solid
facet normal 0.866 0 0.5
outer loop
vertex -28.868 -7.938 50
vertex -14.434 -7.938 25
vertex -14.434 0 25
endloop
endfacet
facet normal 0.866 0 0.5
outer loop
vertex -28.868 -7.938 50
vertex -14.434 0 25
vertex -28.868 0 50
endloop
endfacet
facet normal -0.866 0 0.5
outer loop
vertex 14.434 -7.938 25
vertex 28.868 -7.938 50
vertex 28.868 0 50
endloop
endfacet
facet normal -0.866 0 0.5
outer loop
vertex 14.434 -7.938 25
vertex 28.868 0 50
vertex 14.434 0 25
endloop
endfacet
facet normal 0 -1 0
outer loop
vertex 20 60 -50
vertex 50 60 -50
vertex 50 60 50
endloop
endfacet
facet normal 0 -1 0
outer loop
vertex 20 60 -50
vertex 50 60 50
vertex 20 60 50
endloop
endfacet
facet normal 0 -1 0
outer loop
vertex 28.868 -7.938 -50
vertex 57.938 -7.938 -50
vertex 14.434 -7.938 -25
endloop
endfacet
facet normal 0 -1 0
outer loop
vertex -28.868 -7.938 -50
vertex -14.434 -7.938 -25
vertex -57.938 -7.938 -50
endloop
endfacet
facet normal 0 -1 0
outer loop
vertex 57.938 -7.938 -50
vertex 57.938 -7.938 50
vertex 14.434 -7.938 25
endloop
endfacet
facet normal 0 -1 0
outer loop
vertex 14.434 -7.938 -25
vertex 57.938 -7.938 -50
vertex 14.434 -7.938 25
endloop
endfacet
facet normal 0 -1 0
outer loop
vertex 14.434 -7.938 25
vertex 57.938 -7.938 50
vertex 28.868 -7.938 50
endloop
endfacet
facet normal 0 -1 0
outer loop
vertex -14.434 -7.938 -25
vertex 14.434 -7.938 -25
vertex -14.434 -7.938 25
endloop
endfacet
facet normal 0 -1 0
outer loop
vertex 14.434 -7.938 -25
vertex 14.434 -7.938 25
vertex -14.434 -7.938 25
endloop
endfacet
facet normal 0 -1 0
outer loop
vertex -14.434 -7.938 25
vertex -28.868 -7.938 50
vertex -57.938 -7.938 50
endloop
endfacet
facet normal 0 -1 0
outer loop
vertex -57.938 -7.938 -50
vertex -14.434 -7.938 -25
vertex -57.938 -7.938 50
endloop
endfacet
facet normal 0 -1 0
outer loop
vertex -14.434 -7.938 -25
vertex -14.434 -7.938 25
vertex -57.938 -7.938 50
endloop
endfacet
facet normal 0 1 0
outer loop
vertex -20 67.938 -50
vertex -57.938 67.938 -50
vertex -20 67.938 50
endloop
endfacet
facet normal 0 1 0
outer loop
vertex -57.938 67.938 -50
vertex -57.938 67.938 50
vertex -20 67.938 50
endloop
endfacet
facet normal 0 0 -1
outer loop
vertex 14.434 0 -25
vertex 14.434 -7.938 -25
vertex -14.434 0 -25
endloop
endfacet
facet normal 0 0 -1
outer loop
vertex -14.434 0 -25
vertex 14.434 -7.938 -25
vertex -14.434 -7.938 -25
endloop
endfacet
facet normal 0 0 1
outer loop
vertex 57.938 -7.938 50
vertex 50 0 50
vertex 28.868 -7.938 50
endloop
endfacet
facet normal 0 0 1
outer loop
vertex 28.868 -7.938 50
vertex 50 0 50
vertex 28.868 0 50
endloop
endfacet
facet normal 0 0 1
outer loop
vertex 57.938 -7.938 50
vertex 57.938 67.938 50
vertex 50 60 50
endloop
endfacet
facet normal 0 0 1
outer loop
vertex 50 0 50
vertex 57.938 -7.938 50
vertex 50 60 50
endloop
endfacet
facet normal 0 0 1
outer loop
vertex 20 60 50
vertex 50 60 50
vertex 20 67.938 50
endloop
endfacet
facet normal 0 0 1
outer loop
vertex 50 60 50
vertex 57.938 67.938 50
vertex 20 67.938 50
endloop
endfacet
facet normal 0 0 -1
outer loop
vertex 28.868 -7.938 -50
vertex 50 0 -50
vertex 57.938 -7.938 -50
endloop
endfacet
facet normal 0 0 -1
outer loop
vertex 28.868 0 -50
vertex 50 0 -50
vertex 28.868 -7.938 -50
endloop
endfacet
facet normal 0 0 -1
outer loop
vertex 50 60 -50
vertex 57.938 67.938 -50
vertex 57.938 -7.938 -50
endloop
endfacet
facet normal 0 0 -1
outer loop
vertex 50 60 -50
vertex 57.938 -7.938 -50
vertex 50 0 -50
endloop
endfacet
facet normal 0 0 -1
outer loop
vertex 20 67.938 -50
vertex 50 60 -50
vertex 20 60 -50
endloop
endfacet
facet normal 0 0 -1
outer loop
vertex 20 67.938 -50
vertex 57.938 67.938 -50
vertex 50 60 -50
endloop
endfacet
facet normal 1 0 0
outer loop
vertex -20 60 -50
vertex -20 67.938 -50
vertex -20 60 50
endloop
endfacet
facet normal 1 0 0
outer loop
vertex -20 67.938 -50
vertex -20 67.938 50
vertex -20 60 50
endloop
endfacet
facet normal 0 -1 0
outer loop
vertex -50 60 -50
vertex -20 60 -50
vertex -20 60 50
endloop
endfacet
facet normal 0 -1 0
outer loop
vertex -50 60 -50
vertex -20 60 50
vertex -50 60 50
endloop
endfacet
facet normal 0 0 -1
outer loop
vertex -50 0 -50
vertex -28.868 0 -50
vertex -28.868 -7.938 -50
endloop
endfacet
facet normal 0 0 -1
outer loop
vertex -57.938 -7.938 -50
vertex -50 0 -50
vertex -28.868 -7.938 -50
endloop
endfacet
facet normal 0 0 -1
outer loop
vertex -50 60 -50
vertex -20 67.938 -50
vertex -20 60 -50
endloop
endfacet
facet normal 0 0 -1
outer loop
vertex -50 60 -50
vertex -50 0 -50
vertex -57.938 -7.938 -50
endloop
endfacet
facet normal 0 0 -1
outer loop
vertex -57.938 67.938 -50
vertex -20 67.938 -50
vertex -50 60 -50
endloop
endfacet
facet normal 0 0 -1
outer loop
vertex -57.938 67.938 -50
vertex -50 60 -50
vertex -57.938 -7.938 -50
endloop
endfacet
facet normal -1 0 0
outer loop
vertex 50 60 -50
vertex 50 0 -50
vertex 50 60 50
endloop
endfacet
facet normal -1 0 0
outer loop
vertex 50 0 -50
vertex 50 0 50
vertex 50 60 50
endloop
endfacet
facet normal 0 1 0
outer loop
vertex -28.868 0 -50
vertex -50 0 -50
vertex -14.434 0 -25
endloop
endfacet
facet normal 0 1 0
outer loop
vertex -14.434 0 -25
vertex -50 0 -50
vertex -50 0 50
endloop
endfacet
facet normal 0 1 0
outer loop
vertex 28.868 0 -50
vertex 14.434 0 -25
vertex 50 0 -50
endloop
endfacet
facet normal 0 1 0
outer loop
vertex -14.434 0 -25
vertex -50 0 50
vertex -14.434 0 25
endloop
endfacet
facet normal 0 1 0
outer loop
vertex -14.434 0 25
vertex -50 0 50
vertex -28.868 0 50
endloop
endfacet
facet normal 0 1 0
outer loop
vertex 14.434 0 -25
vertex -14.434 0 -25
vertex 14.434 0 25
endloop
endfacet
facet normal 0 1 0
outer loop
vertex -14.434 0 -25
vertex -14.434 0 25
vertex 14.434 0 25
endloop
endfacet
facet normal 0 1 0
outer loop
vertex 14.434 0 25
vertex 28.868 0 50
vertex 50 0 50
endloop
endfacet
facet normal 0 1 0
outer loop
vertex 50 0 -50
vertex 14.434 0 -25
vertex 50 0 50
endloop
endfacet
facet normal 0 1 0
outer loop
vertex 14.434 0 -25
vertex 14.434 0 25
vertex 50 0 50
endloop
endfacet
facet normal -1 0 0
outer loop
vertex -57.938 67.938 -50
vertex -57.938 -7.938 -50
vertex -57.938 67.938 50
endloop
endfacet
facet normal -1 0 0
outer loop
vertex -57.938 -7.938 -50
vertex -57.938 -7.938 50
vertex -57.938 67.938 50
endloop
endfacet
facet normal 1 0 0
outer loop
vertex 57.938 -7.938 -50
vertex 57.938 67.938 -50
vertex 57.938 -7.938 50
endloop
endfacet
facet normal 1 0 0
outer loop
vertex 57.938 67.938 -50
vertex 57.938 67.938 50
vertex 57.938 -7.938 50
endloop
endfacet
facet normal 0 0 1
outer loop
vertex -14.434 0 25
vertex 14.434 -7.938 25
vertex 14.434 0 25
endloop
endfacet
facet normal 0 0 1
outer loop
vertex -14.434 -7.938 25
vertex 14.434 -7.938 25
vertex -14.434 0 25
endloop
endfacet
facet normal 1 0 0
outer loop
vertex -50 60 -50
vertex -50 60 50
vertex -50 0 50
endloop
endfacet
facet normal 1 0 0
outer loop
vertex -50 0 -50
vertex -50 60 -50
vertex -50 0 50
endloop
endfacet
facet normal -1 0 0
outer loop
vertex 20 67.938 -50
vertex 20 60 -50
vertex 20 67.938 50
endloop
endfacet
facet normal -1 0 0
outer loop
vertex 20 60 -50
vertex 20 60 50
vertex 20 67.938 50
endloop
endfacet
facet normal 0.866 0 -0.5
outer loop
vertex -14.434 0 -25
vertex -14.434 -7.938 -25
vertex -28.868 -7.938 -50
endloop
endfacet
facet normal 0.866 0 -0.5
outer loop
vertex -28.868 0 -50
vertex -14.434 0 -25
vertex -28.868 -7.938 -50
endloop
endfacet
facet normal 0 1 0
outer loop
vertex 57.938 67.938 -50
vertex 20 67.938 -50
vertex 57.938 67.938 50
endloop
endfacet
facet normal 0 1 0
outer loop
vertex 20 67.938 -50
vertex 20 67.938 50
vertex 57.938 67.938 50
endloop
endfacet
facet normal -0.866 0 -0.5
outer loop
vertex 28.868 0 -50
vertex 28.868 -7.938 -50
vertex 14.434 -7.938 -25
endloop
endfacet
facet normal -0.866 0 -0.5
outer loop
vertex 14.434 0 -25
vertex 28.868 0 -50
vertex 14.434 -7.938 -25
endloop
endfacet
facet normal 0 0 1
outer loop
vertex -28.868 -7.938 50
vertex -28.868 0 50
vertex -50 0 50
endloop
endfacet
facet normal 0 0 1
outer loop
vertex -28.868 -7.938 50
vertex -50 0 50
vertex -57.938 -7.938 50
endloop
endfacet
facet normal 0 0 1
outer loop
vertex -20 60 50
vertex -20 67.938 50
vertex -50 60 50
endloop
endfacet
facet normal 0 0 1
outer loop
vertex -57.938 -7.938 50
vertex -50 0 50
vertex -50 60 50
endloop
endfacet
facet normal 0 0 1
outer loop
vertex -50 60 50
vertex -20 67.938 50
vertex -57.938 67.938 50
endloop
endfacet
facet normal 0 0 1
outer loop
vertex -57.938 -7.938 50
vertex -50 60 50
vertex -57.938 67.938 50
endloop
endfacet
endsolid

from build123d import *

# Parameters (mm, degrees)
SALIENTE_EXTRUIR1_DEPTH = 50
CORTAR_EXTRUIR1_DEPTH   = 10


with BuildPart() as part:
    # Croquis1 → Saliente-Extruir1 (new, symmetric)
    with BuildSketch(Plane.XY):
        Polygon((-50, 0), (50, 0), (50, 60), (20, 60), (20, 67.9375), (57.9375, 67.9375), (57.9375, -7.9375), (-57.9375, -7.9375), (-57.9375, 67.9375), (-20, 67.9375), (-20, 60), (-50, 60), align=None)
    extrude(amount=SALIENTE_EXTRUIR1_DEPTH, both=True)

    # Croquis2 → Cortar-Extruir1 (cut)
    with BuildSketch(Plane.XZ.offset(7.9375)):
        Polygon((-28.867513459, -50), (28.867513459, -50), (14.43375673, -25), (-14.43375673, -25), align=None)
        Polygon((-28.867513459, 50), (28.867513459, 50), (14.43375673, 25), (-14.43375673, 25), align=None)
    extrude(amount=-CORTAR_EXTRUIR1_DEPTH, mode=Mode.SUBTRACT)


solid = part.part
